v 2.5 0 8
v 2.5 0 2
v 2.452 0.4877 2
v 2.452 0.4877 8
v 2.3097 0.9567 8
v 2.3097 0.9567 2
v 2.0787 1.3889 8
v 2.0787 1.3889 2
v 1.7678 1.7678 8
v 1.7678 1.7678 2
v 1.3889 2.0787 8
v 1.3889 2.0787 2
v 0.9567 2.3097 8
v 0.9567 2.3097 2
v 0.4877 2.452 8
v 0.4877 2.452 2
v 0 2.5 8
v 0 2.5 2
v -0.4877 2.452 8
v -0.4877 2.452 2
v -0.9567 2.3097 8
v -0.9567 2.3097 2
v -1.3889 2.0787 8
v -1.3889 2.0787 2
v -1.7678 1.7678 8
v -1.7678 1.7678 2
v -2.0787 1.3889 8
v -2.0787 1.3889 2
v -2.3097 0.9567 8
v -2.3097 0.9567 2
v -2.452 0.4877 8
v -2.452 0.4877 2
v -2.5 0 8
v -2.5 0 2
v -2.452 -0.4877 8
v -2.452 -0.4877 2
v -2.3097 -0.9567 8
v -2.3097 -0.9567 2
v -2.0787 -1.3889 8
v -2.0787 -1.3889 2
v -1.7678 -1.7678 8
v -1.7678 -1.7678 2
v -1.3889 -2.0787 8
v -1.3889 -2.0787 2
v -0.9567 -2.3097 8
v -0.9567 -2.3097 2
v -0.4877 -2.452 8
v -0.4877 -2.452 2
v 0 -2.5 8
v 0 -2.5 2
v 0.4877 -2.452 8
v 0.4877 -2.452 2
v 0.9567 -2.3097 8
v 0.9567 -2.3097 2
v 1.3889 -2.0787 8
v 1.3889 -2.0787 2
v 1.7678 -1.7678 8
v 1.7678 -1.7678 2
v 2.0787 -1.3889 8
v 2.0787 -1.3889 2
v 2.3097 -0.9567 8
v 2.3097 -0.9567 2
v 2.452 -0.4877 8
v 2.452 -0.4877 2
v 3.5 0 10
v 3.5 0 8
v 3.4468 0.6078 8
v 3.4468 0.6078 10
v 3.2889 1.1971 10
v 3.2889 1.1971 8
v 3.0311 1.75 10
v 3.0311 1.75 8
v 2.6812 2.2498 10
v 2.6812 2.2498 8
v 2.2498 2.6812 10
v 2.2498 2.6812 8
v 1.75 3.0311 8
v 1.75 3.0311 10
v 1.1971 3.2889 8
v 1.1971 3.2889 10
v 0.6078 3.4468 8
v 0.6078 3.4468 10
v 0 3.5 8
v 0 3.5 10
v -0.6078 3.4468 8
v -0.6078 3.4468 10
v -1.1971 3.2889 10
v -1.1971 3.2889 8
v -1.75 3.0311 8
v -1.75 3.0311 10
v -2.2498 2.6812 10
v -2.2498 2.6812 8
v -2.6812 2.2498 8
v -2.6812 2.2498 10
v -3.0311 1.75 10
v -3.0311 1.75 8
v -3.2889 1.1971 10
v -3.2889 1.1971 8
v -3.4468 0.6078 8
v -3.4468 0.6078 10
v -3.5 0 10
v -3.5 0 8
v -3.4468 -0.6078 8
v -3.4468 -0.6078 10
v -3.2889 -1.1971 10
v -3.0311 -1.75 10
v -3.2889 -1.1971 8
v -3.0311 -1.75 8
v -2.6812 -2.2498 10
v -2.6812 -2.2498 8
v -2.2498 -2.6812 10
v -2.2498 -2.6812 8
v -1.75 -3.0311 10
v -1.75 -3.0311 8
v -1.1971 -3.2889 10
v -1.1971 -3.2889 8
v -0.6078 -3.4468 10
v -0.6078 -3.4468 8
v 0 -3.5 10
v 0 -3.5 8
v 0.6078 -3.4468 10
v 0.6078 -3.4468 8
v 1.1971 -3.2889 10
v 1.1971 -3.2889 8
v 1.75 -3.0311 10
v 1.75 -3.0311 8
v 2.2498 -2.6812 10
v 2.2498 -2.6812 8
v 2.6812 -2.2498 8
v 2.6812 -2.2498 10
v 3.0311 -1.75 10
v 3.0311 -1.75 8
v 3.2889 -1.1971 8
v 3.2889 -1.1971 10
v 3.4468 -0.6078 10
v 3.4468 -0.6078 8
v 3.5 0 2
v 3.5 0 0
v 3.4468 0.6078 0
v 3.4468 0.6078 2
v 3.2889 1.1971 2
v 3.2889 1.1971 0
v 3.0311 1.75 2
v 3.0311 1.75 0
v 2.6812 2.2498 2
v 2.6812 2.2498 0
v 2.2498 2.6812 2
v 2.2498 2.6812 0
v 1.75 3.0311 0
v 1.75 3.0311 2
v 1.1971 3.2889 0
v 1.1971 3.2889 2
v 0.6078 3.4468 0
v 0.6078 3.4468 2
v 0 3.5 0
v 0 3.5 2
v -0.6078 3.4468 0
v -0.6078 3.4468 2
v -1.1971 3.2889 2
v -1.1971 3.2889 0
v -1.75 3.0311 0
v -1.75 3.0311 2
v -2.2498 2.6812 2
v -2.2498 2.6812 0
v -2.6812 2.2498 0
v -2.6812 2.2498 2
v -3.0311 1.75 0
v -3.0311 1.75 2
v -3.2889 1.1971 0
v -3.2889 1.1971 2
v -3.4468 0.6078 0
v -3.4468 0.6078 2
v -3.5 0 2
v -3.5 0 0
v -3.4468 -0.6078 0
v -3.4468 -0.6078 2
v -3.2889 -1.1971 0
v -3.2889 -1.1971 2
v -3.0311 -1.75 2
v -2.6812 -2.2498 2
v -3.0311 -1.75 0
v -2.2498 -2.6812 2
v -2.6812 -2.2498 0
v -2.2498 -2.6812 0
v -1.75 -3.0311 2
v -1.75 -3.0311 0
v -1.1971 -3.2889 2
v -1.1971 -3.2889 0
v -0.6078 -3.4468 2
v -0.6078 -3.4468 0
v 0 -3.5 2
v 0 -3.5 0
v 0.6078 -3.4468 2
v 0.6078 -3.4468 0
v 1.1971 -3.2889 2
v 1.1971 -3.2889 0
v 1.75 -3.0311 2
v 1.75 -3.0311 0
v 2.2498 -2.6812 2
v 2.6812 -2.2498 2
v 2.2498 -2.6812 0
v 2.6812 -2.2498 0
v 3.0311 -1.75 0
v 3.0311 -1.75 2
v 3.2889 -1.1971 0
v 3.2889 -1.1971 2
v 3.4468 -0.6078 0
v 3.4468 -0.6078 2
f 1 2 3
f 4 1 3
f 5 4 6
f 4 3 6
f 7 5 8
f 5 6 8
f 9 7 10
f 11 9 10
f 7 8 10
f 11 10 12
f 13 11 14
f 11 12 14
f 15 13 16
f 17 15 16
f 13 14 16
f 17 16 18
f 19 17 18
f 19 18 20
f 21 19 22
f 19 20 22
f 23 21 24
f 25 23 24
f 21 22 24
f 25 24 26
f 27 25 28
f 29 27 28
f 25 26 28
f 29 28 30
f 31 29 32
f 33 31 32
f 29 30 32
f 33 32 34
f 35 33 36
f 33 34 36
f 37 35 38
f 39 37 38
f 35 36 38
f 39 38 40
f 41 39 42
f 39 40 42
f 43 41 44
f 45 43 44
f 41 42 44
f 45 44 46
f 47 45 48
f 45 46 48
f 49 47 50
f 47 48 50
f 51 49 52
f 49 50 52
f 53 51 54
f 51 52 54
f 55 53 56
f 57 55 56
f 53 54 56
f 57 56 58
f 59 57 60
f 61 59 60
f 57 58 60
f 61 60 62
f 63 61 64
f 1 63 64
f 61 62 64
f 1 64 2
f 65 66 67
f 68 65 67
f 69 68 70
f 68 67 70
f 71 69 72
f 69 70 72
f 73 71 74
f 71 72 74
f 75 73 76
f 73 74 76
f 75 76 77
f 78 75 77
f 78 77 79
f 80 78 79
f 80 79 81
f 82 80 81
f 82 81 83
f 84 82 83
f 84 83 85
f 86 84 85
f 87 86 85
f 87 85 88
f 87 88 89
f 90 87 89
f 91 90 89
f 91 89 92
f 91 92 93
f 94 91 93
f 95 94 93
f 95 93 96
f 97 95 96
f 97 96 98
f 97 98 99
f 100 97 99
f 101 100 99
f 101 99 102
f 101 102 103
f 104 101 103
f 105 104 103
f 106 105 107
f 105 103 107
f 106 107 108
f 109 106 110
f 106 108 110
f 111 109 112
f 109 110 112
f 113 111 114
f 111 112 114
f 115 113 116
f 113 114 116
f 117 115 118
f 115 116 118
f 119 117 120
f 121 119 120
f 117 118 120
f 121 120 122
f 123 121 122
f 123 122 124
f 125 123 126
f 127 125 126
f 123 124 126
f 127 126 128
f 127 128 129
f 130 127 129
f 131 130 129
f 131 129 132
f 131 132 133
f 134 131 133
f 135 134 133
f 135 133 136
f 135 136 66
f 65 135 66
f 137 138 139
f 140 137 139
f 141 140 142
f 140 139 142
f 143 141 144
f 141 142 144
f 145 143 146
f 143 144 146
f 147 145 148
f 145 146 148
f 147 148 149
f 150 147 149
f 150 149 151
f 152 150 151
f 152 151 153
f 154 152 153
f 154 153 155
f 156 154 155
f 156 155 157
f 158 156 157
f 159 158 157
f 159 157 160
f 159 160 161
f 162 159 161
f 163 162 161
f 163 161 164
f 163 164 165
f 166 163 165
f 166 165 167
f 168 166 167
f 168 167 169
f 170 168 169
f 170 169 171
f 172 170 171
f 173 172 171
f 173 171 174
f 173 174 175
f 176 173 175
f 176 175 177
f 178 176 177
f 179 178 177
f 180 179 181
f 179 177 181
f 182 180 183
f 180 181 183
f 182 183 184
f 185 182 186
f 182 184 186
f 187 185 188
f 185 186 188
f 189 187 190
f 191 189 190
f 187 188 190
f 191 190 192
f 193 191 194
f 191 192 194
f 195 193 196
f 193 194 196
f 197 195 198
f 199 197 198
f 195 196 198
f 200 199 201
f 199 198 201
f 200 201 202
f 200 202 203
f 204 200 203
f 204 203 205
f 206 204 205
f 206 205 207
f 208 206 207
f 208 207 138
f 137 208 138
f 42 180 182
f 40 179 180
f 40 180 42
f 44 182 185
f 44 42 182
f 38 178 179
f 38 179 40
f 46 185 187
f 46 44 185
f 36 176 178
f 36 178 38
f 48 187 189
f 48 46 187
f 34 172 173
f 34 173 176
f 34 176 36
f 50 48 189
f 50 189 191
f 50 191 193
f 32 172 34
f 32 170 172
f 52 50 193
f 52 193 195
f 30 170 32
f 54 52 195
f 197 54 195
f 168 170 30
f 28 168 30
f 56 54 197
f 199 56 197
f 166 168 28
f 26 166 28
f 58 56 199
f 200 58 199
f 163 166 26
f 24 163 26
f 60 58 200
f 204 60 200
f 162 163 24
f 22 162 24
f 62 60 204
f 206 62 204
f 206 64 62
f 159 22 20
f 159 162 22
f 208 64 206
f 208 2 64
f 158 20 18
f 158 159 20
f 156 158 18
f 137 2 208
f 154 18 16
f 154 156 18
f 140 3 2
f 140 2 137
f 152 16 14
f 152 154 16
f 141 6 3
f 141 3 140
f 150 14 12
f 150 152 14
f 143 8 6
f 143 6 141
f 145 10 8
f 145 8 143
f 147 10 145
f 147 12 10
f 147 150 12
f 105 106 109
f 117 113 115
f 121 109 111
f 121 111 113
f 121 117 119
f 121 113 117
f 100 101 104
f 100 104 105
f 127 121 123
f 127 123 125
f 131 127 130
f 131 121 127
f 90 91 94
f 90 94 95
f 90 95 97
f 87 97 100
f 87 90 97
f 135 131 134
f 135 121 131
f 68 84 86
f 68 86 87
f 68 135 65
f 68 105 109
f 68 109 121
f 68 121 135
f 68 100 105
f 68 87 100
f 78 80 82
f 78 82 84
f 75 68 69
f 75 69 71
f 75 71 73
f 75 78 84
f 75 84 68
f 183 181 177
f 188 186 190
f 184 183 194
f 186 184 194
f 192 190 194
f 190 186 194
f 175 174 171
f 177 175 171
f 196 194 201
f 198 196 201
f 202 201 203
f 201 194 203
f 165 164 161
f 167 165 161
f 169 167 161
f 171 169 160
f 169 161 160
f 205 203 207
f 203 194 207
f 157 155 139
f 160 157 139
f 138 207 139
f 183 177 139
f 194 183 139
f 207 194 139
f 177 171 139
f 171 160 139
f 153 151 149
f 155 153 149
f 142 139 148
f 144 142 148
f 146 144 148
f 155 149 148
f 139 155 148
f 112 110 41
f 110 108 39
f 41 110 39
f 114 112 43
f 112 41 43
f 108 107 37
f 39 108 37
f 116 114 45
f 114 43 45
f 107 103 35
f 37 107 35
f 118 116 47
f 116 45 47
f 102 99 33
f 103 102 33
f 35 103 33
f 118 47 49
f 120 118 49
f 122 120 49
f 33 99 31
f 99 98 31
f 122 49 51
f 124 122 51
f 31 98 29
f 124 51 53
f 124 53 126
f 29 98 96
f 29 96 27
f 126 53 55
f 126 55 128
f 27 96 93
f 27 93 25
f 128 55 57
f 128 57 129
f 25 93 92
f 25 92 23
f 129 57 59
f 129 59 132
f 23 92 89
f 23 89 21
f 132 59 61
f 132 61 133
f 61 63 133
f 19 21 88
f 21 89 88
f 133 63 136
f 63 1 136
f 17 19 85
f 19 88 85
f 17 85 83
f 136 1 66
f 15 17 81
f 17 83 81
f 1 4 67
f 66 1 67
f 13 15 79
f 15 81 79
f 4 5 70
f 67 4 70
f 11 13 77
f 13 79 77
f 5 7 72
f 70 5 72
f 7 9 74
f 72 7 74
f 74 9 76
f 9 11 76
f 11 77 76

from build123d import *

# Parameters (mm, degrees)
SKETCH1_R               = 3.5
BOSS_EXTRUDE1_DEPTH     = 10
CUT_EXTRUDE1_DEPTH      = 3
CUT_EXTRUDE1_DEPTH_BACK = 3
CUT_EXTRUDE1_START      = -5
SKETCH2_R               = 3.5
SKETCH2_R_2             = 2.5


with BuildPart() as part:
    # Sketch1 → Boss-Extrude1 (new body)
    with BuildSketch(Plane.XY):
        Circle(SKETCH1_R)
    extrude(amount=BOSS_EXTRUDE1_DEPTH)

    # Sketch2 → Cut-Extrude1 (cut, two sides: drawn at the far end of the back side and taken through both)
    with BuildSketch(Plane.XY.offset(10).offset(CUT_EXTRUDE1_START - CUT_EXTRUDE1_DEPTH_BACK)):
        Circle(SKETCH2_R)
        Circle(SKETCH2_R_2, mode=Mode.SUBTRACT)
    extrude(amount=CUT_EXTRUDE1_DEPTH + CUT_EXTRUDE1_DEPTH_BACK, mode=Mode.SUBTRACT)


solid = part.part
